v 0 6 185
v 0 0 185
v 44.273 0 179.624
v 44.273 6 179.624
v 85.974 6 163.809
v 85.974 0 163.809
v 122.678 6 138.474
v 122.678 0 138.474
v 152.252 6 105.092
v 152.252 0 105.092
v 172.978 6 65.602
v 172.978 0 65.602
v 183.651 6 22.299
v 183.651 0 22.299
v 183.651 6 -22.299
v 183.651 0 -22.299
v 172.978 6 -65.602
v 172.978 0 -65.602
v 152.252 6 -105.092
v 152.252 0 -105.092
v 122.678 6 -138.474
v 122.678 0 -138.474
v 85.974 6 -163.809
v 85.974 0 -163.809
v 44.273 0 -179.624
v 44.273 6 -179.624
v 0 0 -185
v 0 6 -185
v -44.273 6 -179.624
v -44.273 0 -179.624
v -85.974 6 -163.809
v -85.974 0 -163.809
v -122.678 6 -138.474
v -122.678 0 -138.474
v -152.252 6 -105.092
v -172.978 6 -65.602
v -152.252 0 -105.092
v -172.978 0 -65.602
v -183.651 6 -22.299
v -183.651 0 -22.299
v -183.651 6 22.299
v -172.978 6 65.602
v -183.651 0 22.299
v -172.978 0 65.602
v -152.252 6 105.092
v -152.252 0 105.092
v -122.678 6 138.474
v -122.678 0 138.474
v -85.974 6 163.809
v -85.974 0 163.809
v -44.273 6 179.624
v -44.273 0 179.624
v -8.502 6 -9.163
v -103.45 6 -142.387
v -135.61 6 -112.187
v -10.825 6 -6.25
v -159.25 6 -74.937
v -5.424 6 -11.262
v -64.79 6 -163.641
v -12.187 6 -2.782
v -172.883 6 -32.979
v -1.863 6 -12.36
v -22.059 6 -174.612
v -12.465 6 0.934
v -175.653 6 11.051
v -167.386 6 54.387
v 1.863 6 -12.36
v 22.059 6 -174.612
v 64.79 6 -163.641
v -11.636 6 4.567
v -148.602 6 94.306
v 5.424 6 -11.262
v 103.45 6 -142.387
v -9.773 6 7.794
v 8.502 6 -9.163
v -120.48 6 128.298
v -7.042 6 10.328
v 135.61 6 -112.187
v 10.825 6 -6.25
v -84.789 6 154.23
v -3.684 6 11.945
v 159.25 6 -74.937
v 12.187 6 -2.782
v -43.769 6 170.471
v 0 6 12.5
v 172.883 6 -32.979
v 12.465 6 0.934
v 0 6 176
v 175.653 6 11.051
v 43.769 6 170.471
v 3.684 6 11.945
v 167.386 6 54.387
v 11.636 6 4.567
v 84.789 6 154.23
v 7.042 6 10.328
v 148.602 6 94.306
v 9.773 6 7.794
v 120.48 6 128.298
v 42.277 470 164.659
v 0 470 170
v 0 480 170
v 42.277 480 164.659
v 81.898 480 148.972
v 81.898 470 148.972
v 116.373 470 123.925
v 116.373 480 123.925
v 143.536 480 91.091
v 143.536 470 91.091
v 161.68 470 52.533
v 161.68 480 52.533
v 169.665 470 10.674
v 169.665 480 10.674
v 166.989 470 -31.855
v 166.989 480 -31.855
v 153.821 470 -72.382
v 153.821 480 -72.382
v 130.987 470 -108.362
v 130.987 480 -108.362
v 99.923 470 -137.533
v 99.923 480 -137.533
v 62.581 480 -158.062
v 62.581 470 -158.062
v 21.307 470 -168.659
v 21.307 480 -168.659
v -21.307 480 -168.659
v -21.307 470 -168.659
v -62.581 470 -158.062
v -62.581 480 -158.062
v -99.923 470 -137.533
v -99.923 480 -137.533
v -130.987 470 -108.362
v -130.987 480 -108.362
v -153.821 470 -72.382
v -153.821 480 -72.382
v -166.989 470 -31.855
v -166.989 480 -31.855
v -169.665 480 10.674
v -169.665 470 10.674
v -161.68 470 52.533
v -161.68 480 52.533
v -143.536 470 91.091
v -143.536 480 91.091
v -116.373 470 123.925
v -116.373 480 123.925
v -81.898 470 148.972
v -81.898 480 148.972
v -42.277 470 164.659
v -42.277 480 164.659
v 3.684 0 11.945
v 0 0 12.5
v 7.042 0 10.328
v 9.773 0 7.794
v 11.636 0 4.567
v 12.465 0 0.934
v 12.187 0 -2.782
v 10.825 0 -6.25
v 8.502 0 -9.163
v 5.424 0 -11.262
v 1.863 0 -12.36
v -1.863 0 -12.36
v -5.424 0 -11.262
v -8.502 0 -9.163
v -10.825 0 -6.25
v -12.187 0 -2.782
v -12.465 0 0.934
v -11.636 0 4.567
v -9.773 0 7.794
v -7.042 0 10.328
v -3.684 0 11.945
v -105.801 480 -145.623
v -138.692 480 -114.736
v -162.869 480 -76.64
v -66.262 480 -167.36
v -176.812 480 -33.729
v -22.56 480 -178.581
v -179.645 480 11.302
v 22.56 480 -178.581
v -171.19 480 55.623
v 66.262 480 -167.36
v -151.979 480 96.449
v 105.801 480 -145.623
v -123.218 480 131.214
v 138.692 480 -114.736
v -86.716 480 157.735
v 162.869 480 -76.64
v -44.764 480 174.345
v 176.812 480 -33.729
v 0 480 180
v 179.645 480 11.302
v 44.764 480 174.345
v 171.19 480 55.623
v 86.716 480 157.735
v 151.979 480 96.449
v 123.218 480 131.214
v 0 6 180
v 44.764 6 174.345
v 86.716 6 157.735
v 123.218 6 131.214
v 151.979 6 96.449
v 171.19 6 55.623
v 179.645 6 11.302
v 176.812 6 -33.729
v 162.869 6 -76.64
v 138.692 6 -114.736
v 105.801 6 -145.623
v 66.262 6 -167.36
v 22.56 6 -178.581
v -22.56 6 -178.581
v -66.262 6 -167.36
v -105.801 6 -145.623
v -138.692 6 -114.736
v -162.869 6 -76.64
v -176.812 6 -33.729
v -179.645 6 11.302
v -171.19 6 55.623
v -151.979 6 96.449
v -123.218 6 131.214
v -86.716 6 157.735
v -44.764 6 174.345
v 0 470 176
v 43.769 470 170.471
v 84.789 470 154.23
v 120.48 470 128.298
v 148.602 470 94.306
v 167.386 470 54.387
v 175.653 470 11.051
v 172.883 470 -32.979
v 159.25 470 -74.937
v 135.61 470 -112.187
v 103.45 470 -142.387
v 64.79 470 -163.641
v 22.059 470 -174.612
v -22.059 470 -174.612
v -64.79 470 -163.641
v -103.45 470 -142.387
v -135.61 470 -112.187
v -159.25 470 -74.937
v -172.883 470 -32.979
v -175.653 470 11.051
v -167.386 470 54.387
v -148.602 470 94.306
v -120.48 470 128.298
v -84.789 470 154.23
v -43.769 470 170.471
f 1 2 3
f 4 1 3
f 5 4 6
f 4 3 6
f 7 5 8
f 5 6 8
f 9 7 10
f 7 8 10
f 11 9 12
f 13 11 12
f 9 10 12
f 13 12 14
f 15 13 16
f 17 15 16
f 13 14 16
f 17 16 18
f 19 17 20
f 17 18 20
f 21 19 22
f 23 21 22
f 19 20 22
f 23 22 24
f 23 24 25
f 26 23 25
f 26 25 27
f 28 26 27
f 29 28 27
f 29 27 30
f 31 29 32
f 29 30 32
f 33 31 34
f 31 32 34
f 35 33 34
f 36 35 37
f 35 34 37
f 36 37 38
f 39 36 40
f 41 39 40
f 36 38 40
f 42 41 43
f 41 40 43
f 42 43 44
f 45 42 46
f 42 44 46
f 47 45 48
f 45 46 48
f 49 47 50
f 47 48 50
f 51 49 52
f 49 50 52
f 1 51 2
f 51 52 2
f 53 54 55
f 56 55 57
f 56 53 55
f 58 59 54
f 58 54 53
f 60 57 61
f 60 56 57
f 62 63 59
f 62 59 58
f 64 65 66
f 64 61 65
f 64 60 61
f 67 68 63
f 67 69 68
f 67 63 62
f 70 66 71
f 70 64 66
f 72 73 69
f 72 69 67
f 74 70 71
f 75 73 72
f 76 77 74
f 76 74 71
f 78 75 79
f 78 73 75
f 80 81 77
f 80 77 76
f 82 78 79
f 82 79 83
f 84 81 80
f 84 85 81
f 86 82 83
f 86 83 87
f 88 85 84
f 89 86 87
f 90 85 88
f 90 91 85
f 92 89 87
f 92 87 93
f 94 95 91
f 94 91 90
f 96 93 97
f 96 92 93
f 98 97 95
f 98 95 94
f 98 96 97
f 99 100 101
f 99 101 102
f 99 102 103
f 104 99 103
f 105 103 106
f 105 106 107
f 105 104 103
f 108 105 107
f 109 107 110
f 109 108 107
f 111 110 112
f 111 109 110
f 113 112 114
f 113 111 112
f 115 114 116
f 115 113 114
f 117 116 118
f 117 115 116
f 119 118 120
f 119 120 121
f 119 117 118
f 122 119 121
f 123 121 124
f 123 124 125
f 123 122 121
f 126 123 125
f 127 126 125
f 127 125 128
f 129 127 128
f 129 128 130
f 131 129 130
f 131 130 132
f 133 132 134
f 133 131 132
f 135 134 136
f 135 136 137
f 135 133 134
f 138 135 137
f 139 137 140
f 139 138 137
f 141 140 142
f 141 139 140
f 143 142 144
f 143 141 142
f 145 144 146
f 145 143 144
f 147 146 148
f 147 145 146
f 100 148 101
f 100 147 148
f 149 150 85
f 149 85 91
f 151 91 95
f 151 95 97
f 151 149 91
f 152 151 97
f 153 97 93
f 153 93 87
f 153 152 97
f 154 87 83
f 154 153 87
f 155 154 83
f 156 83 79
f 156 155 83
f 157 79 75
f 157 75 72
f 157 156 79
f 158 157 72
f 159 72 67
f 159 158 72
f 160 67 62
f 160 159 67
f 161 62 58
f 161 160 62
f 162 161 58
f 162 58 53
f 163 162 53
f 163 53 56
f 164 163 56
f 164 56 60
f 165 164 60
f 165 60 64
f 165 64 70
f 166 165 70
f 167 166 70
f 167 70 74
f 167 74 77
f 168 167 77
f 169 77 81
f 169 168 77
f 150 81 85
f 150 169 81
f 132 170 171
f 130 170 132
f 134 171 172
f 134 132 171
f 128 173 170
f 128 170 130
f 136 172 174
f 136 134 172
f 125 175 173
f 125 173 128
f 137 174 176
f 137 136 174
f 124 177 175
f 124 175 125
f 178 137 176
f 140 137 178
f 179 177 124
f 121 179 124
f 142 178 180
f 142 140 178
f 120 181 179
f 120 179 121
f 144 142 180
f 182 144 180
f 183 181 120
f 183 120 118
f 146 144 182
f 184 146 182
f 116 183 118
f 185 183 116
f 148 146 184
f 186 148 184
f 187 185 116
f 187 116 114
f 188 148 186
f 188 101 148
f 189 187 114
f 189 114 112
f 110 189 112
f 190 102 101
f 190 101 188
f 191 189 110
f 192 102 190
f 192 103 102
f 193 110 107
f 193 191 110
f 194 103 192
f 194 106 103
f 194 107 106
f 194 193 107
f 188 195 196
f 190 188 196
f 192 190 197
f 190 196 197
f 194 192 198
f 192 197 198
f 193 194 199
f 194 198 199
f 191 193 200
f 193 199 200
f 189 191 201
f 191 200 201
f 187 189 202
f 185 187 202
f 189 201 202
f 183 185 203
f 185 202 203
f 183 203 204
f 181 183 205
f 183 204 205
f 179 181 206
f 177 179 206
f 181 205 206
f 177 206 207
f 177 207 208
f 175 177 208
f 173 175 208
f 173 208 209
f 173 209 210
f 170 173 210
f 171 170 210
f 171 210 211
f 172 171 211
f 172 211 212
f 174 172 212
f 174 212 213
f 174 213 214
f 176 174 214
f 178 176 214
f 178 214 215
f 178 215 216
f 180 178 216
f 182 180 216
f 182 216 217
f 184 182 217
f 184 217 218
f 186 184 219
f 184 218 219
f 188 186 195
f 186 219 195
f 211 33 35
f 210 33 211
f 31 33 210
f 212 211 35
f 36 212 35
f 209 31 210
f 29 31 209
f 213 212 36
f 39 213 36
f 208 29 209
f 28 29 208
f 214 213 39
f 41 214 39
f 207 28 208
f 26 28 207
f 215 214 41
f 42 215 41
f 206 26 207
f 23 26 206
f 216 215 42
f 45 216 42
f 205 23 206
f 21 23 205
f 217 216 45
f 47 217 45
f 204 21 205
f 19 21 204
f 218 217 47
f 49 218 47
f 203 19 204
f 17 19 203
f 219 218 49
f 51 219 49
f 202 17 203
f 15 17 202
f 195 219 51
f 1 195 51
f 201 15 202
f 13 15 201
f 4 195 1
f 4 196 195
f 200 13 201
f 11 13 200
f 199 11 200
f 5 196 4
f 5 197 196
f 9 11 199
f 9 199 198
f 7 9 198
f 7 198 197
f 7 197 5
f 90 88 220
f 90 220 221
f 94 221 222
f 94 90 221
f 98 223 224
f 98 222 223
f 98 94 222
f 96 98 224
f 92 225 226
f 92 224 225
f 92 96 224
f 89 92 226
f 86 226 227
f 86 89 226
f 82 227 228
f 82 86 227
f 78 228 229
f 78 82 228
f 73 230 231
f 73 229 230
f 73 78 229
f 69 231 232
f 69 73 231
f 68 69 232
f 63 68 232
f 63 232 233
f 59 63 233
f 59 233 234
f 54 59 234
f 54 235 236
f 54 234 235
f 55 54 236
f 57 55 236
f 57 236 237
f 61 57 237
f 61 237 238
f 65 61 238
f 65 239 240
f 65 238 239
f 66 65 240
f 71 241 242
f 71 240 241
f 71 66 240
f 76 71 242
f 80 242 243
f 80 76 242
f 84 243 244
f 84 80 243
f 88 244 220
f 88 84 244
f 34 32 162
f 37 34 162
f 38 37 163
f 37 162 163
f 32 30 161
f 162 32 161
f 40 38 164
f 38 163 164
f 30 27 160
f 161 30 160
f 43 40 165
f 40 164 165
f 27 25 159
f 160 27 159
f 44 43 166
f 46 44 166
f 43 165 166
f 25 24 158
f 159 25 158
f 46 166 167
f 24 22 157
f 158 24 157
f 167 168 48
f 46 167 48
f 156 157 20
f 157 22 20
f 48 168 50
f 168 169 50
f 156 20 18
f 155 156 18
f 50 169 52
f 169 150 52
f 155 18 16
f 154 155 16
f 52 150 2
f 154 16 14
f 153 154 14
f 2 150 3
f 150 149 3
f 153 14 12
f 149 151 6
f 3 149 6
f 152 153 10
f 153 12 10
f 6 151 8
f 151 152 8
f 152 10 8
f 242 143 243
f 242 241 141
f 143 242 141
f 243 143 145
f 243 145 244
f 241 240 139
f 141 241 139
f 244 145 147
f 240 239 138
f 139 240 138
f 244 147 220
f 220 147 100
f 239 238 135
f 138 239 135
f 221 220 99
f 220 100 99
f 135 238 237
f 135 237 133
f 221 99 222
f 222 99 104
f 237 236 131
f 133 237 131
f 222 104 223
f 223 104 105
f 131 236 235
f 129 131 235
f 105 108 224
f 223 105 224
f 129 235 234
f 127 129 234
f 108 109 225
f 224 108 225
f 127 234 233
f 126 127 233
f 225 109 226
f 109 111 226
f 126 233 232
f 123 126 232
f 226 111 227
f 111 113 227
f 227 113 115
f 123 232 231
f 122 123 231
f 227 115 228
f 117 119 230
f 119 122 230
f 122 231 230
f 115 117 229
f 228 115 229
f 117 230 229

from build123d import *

# Parameters (mm, degrees)
RECEPTACLE_FLOOR_SKETCH_R   = 185
RECEPTACLE_FLOOR_SKETCH_R_2 = 12.5
RECEPTACLE_FLOOR_DEPTH      = 6
RECEPTACLE_WALL_SKETCH_R    = 180
RECEPTACLE_WALL_SKETCH_R_2  = 176
RECEPTACLE_WALL_DEPTH       = 480
POT_START                   = 470
POT_SEAT_LEDGE_SKETCH_R     = 177
POT_SEAT_LEDGE_SKETCH_R_2   = 170
POT_SEAT_LEDGE_DEPTH        = 10


with BuildPart() as part:
    # Receptacle Floor Sketch → Receptacle Floor (new body)
    with BuildSketch(Plane(origin=(0, 0, 0), x_dir=(1, 0, 0), z_dir=(0, 1, 0))):
        with Locations(Location((0, 0, 0), (0, 0, 270))):
            Circle(RECEPTACLE_FLOOR_SKETCH_R)
        with Locations(Location((0, 0, 0), (0, 0, 270))):
            Circle(RECEPTACLE_FLOOR_SKETCH_R_2, mode=Mode.SUBTRACT)
    extrude(amount=RECEPTACLE_FLOOR_DEPTH)

    # Receptacle Wall Sketch → Receptacle Wall (add)
    with BuildSketch(Plane(origin=(0, 0, 0), x_dir=(1, 0, 0), z_dir=(0, 1, 0))):
        with Locations(Location((0, 0, 0), (0, 0, 270))):
            Circle(RECEPTACLE_WALL_SKETCH_R)
        with Locations(Location((0, 0, 0), (0, 0, 270))):
            Circle(RECEPTACLE_WALL_SKETCH_R_2, mode=Mode.SUBTRACT)
    extrude(amount=RECEPTACLE_WALL_DEPTH)

    # Pot Seat Ledge Sketch → Pot Seat Ledge (add)
    with BuildSketch(Plane(origin=(0, 0, 0), x_dir=(1, 0, 0), z_dir=(0, 1, 0)).offset(POT_START)):
        Circle(POT_SEAT_LEDGE_SKETCH_R)
        with Locations(Location((0, 0, 0), (0, 0, 270))):
            Circle(POT_SEAT_LEDGE_SKETCH_R_2, mode=Mode.SUBTRACT)
    extrude(amount=POT_SEAT_LEDGE_DEPTH)


solid = part.part
